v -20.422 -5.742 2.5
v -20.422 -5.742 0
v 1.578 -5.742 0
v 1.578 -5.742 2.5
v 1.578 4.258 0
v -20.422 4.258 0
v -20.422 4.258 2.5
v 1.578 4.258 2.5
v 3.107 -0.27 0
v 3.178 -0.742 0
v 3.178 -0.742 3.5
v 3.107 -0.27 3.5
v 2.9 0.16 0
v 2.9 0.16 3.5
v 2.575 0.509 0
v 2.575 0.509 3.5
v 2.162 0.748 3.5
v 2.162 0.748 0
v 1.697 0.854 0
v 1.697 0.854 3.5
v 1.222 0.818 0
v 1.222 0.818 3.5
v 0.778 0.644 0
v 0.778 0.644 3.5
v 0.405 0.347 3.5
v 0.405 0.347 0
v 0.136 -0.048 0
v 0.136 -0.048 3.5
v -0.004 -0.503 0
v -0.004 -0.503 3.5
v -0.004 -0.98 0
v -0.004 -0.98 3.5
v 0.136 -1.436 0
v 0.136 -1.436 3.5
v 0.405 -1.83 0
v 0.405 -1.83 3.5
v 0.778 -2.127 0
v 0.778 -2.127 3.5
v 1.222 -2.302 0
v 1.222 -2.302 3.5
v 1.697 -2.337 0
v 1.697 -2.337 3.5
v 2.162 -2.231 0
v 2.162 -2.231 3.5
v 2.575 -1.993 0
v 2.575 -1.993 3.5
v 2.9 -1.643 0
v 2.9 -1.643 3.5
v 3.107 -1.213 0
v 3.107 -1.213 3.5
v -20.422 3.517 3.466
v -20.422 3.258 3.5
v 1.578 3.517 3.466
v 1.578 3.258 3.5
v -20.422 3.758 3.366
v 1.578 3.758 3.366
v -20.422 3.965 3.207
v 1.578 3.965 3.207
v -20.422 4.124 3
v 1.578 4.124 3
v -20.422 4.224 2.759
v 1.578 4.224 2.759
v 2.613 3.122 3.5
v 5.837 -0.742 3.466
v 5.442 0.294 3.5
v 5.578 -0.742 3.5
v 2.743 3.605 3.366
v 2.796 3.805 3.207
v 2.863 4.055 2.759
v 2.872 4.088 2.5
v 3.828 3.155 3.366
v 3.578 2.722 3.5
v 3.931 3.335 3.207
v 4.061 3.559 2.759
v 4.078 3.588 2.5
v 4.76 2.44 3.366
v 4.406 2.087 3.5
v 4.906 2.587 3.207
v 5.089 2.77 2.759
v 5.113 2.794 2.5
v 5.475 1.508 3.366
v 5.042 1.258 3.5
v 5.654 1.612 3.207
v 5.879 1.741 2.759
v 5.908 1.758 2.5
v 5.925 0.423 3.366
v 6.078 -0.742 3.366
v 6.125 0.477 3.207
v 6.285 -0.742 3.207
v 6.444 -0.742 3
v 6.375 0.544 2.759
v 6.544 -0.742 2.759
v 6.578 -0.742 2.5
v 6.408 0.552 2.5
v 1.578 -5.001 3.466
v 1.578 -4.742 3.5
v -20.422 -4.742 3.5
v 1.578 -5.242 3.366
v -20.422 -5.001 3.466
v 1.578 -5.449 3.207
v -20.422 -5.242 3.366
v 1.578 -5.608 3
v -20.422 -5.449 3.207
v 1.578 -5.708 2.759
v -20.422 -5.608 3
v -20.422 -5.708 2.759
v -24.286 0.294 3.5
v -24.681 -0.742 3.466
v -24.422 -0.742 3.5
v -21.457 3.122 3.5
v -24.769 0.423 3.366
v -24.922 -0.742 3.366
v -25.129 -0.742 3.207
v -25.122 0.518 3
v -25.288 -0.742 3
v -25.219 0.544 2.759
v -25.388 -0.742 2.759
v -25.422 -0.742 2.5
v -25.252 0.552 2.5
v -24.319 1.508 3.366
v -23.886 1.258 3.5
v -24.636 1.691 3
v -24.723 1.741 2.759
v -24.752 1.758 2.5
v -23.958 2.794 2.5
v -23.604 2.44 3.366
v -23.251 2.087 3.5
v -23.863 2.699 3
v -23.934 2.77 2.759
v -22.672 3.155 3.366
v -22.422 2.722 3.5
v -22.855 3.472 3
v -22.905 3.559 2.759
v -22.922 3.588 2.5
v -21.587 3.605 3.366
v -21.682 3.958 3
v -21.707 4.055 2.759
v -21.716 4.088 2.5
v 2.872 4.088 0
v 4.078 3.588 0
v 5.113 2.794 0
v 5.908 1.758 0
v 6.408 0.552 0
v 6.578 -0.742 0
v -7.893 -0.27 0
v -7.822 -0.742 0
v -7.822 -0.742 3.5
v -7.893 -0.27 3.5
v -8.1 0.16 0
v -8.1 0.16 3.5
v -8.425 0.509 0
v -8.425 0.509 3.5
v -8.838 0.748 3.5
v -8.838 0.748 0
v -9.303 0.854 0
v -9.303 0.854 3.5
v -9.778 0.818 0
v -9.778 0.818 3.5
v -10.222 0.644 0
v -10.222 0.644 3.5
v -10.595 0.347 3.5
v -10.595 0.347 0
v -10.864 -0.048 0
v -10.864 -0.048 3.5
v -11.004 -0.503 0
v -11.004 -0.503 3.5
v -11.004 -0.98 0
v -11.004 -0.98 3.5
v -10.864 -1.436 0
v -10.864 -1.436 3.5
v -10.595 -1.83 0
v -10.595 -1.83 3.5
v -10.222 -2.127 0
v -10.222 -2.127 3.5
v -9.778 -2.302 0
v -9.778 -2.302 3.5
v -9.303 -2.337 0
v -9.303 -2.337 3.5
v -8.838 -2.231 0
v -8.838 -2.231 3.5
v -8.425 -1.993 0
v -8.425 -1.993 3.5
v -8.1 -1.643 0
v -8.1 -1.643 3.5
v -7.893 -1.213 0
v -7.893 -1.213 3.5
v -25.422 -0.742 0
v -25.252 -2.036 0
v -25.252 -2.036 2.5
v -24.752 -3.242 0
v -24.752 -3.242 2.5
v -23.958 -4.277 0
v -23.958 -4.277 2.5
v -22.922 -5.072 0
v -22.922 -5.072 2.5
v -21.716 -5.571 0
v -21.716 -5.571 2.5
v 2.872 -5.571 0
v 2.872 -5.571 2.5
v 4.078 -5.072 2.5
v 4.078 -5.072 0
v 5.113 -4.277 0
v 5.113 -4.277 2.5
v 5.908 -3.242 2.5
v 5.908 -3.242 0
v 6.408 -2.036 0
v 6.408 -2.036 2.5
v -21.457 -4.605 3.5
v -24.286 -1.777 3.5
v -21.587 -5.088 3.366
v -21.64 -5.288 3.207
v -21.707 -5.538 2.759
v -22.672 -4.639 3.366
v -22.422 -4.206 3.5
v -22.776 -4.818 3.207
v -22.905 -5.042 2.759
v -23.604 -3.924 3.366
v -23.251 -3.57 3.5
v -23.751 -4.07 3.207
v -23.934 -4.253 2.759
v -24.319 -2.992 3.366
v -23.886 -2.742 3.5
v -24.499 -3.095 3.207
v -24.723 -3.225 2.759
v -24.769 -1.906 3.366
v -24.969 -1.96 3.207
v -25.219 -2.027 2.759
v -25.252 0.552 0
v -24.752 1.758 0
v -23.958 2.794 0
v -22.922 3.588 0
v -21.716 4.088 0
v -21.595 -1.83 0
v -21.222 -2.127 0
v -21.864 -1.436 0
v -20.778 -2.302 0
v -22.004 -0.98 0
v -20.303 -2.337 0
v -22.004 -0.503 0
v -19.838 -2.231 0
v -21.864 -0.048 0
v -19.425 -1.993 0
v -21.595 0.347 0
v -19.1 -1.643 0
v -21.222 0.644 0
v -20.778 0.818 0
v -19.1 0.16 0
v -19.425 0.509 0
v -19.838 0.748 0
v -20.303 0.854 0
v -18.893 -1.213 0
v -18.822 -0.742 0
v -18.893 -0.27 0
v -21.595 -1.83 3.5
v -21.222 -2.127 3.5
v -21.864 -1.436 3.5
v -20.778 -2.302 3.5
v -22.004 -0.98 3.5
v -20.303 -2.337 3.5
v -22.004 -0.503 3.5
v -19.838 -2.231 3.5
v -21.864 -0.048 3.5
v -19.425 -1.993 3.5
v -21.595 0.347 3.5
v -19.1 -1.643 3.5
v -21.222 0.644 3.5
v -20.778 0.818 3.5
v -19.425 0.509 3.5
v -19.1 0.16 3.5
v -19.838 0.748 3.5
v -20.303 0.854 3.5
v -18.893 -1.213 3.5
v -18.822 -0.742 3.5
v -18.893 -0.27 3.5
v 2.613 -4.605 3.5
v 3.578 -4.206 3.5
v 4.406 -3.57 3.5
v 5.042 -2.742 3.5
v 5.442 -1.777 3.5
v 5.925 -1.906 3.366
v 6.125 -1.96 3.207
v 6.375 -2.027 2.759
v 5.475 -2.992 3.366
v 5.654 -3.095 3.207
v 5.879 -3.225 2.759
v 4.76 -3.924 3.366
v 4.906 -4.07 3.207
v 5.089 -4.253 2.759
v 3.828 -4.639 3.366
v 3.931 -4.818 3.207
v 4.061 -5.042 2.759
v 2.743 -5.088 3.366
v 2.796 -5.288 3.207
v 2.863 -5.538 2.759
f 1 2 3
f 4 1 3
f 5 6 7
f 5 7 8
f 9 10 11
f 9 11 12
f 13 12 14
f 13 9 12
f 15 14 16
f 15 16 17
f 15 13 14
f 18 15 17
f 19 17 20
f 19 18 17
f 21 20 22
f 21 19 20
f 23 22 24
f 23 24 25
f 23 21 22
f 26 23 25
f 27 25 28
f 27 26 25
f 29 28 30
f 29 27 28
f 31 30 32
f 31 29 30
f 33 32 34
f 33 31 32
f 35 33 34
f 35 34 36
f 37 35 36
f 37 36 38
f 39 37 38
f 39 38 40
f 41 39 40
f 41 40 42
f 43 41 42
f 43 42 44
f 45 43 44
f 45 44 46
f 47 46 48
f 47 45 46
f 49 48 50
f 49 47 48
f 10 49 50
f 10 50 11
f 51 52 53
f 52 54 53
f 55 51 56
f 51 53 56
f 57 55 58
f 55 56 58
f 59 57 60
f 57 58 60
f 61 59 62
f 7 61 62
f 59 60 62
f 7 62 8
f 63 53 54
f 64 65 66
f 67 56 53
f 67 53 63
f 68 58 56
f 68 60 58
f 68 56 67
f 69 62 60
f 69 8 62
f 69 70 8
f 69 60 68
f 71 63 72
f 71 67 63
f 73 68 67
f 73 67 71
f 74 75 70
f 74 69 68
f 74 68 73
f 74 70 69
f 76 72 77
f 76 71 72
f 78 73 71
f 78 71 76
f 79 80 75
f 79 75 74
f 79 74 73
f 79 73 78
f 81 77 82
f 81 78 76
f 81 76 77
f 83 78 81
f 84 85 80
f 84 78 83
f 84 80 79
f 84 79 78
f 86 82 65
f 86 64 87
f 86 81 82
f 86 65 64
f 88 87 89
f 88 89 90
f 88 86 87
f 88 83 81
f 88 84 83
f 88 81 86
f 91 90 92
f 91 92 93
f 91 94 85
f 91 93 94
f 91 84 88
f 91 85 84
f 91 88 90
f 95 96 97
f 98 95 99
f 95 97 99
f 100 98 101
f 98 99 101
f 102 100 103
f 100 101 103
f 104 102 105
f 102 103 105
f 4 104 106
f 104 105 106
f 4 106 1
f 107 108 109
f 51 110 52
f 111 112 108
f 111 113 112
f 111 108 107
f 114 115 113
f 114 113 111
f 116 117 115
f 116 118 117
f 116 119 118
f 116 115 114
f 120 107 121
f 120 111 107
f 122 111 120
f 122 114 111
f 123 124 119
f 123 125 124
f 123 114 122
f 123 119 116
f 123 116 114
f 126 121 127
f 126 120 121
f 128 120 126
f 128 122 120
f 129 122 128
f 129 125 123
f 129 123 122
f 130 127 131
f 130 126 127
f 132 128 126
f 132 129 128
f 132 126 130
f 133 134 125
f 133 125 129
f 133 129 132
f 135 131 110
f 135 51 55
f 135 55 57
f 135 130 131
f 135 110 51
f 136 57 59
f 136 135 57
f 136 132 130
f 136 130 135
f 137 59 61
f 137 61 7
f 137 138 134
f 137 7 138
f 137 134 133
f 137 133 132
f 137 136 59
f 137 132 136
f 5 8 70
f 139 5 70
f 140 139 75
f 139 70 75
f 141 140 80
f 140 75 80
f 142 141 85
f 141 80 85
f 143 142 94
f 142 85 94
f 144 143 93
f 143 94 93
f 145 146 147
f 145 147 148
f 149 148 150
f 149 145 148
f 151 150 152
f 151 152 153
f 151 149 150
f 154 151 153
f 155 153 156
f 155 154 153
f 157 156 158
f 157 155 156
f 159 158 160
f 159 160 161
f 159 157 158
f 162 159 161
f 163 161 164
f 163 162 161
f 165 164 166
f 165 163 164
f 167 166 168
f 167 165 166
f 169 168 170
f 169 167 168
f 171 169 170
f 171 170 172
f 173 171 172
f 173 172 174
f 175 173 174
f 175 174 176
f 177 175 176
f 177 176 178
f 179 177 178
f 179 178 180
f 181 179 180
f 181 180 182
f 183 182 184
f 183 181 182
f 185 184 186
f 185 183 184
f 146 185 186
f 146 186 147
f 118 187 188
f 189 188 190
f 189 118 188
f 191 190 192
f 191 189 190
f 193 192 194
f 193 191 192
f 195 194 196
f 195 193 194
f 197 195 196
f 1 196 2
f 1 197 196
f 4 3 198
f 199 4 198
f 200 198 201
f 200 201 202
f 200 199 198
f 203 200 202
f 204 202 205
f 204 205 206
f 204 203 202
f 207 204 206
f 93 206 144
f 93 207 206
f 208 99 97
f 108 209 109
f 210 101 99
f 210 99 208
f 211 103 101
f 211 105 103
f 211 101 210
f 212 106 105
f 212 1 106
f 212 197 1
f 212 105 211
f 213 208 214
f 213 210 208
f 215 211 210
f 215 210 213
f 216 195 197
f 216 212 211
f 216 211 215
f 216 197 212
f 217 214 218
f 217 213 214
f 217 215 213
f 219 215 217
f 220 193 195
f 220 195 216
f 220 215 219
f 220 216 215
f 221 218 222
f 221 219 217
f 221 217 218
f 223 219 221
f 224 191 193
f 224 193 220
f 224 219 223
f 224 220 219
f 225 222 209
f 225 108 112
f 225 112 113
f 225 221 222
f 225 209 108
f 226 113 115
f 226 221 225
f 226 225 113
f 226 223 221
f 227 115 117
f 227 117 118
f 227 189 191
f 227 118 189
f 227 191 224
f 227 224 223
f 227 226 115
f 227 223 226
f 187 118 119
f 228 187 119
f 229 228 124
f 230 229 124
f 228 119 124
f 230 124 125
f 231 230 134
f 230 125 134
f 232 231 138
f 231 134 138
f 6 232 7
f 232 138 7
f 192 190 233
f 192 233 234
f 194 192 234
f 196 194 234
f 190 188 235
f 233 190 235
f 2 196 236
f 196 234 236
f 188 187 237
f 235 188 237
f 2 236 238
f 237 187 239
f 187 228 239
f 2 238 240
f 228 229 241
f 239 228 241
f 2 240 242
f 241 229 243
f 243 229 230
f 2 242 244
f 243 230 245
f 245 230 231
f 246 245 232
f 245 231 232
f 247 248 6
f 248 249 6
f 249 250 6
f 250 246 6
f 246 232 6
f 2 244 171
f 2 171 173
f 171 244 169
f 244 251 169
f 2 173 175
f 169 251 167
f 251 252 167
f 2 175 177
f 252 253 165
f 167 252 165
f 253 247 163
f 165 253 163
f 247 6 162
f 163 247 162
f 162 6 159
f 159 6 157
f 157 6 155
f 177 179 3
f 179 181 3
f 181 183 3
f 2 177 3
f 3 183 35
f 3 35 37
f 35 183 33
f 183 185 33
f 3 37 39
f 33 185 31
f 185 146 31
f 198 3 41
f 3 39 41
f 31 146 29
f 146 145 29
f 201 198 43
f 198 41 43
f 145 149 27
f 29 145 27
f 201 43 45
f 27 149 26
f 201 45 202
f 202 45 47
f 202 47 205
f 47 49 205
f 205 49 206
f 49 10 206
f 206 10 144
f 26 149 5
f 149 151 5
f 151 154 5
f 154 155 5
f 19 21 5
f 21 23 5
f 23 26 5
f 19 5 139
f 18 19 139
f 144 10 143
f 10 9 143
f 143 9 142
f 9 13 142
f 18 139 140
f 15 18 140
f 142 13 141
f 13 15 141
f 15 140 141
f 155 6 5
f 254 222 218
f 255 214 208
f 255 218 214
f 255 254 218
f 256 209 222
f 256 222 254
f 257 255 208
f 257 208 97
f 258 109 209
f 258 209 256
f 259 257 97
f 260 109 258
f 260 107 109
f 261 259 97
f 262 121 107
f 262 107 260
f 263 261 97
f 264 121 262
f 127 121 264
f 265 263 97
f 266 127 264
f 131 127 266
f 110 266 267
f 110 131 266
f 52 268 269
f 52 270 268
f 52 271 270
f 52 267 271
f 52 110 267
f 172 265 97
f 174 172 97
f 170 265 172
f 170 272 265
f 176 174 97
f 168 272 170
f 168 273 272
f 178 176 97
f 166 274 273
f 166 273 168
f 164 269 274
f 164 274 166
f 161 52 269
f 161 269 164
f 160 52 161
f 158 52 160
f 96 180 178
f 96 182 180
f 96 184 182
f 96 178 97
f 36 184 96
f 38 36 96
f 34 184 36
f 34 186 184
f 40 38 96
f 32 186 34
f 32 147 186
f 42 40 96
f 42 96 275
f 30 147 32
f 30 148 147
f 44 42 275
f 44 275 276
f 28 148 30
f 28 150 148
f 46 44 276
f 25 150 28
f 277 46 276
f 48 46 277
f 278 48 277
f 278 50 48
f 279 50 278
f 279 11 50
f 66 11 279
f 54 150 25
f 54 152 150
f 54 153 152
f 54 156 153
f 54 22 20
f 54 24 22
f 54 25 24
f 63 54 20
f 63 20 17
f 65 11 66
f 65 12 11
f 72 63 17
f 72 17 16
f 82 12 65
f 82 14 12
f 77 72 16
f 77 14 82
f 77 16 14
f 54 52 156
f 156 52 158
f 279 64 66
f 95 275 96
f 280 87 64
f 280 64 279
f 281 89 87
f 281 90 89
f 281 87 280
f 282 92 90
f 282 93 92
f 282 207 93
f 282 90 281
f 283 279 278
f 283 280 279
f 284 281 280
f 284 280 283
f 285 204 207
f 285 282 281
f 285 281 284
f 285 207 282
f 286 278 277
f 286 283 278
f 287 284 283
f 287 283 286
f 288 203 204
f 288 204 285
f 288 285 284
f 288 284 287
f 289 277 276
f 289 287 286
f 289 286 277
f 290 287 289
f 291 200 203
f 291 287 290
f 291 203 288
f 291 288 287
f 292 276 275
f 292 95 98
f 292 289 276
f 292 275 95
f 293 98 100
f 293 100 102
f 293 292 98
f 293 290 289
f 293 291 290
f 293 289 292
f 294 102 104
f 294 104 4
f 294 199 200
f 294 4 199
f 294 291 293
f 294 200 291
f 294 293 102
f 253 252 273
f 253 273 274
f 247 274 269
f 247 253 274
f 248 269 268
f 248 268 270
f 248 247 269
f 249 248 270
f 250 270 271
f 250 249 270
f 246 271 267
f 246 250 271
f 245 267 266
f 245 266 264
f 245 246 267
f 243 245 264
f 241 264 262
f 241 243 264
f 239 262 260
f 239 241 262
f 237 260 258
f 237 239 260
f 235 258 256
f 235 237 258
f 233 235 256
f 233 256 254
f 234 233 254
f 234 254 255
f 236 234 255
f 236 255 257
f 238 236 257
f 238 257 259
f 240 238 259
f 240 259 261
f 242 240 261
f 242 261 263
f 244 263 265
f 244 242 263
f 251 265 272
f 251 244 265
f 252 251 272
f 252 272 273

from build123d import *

# Parameters (mm, degrees)
F0_W     = 32
F0_H     = 10
F0_R     = 1.6
F1_DEPTH = 3.5
F2_R     = 4.99999
F3_R     = 1


# Not quite as in the source:
# - a fillet or chamfer is up to 0.001 mm smaller than in the source, because OpenCascade refuses the exact size


with BuildPart() as f1:
    # F0 (on Top) → F1 (new body)
    with BuildSketch(Plane.XY):
        with Locations((-9.4221055731, -0.7417218951)):
            Rectangle(F0_W, F0_H)
        with Locations((-20.4221047461, -0.7417218951)):
            Circle(F0_R, mode=Mode.SUBTRACT)
        with Locations((-9.4221055731, -0.7417218951)):
            Circle(F0_R, mode=Mode.SUBTRACT)
        with Locations((1.5778944269, -0.7417218951)):
            Circle(F0_R, mode=Mode.SUBTRACT)
    extrude(amount=F1_DEPTH)

    # F2 (radius 5 in the source; OpenCascade refuses exactly that, so slightly less here)
    f2_edges = [f1.edges().sort_by_distance(p)[0] for p in [
        (6.577894, 4.258278, 1.75),
        (6.577894, -5.741722, 1.75),
        (-25.422106, 4.258278, 1.75),
        (-25.422106, -5.741722, 1.75),
    ]]
    fillet(f2_edges, radius=F2_R)

    # F3
    f3_edges = [f1.edges().sort_by_distance(p)[0] for p in [
        (-9.422106, 4.258278, 3.5),
        (-9.422106, -5.741722, 3.5),
    ]]
    fillet(f3_edges, radius=F3_R)


solid = f1.part
